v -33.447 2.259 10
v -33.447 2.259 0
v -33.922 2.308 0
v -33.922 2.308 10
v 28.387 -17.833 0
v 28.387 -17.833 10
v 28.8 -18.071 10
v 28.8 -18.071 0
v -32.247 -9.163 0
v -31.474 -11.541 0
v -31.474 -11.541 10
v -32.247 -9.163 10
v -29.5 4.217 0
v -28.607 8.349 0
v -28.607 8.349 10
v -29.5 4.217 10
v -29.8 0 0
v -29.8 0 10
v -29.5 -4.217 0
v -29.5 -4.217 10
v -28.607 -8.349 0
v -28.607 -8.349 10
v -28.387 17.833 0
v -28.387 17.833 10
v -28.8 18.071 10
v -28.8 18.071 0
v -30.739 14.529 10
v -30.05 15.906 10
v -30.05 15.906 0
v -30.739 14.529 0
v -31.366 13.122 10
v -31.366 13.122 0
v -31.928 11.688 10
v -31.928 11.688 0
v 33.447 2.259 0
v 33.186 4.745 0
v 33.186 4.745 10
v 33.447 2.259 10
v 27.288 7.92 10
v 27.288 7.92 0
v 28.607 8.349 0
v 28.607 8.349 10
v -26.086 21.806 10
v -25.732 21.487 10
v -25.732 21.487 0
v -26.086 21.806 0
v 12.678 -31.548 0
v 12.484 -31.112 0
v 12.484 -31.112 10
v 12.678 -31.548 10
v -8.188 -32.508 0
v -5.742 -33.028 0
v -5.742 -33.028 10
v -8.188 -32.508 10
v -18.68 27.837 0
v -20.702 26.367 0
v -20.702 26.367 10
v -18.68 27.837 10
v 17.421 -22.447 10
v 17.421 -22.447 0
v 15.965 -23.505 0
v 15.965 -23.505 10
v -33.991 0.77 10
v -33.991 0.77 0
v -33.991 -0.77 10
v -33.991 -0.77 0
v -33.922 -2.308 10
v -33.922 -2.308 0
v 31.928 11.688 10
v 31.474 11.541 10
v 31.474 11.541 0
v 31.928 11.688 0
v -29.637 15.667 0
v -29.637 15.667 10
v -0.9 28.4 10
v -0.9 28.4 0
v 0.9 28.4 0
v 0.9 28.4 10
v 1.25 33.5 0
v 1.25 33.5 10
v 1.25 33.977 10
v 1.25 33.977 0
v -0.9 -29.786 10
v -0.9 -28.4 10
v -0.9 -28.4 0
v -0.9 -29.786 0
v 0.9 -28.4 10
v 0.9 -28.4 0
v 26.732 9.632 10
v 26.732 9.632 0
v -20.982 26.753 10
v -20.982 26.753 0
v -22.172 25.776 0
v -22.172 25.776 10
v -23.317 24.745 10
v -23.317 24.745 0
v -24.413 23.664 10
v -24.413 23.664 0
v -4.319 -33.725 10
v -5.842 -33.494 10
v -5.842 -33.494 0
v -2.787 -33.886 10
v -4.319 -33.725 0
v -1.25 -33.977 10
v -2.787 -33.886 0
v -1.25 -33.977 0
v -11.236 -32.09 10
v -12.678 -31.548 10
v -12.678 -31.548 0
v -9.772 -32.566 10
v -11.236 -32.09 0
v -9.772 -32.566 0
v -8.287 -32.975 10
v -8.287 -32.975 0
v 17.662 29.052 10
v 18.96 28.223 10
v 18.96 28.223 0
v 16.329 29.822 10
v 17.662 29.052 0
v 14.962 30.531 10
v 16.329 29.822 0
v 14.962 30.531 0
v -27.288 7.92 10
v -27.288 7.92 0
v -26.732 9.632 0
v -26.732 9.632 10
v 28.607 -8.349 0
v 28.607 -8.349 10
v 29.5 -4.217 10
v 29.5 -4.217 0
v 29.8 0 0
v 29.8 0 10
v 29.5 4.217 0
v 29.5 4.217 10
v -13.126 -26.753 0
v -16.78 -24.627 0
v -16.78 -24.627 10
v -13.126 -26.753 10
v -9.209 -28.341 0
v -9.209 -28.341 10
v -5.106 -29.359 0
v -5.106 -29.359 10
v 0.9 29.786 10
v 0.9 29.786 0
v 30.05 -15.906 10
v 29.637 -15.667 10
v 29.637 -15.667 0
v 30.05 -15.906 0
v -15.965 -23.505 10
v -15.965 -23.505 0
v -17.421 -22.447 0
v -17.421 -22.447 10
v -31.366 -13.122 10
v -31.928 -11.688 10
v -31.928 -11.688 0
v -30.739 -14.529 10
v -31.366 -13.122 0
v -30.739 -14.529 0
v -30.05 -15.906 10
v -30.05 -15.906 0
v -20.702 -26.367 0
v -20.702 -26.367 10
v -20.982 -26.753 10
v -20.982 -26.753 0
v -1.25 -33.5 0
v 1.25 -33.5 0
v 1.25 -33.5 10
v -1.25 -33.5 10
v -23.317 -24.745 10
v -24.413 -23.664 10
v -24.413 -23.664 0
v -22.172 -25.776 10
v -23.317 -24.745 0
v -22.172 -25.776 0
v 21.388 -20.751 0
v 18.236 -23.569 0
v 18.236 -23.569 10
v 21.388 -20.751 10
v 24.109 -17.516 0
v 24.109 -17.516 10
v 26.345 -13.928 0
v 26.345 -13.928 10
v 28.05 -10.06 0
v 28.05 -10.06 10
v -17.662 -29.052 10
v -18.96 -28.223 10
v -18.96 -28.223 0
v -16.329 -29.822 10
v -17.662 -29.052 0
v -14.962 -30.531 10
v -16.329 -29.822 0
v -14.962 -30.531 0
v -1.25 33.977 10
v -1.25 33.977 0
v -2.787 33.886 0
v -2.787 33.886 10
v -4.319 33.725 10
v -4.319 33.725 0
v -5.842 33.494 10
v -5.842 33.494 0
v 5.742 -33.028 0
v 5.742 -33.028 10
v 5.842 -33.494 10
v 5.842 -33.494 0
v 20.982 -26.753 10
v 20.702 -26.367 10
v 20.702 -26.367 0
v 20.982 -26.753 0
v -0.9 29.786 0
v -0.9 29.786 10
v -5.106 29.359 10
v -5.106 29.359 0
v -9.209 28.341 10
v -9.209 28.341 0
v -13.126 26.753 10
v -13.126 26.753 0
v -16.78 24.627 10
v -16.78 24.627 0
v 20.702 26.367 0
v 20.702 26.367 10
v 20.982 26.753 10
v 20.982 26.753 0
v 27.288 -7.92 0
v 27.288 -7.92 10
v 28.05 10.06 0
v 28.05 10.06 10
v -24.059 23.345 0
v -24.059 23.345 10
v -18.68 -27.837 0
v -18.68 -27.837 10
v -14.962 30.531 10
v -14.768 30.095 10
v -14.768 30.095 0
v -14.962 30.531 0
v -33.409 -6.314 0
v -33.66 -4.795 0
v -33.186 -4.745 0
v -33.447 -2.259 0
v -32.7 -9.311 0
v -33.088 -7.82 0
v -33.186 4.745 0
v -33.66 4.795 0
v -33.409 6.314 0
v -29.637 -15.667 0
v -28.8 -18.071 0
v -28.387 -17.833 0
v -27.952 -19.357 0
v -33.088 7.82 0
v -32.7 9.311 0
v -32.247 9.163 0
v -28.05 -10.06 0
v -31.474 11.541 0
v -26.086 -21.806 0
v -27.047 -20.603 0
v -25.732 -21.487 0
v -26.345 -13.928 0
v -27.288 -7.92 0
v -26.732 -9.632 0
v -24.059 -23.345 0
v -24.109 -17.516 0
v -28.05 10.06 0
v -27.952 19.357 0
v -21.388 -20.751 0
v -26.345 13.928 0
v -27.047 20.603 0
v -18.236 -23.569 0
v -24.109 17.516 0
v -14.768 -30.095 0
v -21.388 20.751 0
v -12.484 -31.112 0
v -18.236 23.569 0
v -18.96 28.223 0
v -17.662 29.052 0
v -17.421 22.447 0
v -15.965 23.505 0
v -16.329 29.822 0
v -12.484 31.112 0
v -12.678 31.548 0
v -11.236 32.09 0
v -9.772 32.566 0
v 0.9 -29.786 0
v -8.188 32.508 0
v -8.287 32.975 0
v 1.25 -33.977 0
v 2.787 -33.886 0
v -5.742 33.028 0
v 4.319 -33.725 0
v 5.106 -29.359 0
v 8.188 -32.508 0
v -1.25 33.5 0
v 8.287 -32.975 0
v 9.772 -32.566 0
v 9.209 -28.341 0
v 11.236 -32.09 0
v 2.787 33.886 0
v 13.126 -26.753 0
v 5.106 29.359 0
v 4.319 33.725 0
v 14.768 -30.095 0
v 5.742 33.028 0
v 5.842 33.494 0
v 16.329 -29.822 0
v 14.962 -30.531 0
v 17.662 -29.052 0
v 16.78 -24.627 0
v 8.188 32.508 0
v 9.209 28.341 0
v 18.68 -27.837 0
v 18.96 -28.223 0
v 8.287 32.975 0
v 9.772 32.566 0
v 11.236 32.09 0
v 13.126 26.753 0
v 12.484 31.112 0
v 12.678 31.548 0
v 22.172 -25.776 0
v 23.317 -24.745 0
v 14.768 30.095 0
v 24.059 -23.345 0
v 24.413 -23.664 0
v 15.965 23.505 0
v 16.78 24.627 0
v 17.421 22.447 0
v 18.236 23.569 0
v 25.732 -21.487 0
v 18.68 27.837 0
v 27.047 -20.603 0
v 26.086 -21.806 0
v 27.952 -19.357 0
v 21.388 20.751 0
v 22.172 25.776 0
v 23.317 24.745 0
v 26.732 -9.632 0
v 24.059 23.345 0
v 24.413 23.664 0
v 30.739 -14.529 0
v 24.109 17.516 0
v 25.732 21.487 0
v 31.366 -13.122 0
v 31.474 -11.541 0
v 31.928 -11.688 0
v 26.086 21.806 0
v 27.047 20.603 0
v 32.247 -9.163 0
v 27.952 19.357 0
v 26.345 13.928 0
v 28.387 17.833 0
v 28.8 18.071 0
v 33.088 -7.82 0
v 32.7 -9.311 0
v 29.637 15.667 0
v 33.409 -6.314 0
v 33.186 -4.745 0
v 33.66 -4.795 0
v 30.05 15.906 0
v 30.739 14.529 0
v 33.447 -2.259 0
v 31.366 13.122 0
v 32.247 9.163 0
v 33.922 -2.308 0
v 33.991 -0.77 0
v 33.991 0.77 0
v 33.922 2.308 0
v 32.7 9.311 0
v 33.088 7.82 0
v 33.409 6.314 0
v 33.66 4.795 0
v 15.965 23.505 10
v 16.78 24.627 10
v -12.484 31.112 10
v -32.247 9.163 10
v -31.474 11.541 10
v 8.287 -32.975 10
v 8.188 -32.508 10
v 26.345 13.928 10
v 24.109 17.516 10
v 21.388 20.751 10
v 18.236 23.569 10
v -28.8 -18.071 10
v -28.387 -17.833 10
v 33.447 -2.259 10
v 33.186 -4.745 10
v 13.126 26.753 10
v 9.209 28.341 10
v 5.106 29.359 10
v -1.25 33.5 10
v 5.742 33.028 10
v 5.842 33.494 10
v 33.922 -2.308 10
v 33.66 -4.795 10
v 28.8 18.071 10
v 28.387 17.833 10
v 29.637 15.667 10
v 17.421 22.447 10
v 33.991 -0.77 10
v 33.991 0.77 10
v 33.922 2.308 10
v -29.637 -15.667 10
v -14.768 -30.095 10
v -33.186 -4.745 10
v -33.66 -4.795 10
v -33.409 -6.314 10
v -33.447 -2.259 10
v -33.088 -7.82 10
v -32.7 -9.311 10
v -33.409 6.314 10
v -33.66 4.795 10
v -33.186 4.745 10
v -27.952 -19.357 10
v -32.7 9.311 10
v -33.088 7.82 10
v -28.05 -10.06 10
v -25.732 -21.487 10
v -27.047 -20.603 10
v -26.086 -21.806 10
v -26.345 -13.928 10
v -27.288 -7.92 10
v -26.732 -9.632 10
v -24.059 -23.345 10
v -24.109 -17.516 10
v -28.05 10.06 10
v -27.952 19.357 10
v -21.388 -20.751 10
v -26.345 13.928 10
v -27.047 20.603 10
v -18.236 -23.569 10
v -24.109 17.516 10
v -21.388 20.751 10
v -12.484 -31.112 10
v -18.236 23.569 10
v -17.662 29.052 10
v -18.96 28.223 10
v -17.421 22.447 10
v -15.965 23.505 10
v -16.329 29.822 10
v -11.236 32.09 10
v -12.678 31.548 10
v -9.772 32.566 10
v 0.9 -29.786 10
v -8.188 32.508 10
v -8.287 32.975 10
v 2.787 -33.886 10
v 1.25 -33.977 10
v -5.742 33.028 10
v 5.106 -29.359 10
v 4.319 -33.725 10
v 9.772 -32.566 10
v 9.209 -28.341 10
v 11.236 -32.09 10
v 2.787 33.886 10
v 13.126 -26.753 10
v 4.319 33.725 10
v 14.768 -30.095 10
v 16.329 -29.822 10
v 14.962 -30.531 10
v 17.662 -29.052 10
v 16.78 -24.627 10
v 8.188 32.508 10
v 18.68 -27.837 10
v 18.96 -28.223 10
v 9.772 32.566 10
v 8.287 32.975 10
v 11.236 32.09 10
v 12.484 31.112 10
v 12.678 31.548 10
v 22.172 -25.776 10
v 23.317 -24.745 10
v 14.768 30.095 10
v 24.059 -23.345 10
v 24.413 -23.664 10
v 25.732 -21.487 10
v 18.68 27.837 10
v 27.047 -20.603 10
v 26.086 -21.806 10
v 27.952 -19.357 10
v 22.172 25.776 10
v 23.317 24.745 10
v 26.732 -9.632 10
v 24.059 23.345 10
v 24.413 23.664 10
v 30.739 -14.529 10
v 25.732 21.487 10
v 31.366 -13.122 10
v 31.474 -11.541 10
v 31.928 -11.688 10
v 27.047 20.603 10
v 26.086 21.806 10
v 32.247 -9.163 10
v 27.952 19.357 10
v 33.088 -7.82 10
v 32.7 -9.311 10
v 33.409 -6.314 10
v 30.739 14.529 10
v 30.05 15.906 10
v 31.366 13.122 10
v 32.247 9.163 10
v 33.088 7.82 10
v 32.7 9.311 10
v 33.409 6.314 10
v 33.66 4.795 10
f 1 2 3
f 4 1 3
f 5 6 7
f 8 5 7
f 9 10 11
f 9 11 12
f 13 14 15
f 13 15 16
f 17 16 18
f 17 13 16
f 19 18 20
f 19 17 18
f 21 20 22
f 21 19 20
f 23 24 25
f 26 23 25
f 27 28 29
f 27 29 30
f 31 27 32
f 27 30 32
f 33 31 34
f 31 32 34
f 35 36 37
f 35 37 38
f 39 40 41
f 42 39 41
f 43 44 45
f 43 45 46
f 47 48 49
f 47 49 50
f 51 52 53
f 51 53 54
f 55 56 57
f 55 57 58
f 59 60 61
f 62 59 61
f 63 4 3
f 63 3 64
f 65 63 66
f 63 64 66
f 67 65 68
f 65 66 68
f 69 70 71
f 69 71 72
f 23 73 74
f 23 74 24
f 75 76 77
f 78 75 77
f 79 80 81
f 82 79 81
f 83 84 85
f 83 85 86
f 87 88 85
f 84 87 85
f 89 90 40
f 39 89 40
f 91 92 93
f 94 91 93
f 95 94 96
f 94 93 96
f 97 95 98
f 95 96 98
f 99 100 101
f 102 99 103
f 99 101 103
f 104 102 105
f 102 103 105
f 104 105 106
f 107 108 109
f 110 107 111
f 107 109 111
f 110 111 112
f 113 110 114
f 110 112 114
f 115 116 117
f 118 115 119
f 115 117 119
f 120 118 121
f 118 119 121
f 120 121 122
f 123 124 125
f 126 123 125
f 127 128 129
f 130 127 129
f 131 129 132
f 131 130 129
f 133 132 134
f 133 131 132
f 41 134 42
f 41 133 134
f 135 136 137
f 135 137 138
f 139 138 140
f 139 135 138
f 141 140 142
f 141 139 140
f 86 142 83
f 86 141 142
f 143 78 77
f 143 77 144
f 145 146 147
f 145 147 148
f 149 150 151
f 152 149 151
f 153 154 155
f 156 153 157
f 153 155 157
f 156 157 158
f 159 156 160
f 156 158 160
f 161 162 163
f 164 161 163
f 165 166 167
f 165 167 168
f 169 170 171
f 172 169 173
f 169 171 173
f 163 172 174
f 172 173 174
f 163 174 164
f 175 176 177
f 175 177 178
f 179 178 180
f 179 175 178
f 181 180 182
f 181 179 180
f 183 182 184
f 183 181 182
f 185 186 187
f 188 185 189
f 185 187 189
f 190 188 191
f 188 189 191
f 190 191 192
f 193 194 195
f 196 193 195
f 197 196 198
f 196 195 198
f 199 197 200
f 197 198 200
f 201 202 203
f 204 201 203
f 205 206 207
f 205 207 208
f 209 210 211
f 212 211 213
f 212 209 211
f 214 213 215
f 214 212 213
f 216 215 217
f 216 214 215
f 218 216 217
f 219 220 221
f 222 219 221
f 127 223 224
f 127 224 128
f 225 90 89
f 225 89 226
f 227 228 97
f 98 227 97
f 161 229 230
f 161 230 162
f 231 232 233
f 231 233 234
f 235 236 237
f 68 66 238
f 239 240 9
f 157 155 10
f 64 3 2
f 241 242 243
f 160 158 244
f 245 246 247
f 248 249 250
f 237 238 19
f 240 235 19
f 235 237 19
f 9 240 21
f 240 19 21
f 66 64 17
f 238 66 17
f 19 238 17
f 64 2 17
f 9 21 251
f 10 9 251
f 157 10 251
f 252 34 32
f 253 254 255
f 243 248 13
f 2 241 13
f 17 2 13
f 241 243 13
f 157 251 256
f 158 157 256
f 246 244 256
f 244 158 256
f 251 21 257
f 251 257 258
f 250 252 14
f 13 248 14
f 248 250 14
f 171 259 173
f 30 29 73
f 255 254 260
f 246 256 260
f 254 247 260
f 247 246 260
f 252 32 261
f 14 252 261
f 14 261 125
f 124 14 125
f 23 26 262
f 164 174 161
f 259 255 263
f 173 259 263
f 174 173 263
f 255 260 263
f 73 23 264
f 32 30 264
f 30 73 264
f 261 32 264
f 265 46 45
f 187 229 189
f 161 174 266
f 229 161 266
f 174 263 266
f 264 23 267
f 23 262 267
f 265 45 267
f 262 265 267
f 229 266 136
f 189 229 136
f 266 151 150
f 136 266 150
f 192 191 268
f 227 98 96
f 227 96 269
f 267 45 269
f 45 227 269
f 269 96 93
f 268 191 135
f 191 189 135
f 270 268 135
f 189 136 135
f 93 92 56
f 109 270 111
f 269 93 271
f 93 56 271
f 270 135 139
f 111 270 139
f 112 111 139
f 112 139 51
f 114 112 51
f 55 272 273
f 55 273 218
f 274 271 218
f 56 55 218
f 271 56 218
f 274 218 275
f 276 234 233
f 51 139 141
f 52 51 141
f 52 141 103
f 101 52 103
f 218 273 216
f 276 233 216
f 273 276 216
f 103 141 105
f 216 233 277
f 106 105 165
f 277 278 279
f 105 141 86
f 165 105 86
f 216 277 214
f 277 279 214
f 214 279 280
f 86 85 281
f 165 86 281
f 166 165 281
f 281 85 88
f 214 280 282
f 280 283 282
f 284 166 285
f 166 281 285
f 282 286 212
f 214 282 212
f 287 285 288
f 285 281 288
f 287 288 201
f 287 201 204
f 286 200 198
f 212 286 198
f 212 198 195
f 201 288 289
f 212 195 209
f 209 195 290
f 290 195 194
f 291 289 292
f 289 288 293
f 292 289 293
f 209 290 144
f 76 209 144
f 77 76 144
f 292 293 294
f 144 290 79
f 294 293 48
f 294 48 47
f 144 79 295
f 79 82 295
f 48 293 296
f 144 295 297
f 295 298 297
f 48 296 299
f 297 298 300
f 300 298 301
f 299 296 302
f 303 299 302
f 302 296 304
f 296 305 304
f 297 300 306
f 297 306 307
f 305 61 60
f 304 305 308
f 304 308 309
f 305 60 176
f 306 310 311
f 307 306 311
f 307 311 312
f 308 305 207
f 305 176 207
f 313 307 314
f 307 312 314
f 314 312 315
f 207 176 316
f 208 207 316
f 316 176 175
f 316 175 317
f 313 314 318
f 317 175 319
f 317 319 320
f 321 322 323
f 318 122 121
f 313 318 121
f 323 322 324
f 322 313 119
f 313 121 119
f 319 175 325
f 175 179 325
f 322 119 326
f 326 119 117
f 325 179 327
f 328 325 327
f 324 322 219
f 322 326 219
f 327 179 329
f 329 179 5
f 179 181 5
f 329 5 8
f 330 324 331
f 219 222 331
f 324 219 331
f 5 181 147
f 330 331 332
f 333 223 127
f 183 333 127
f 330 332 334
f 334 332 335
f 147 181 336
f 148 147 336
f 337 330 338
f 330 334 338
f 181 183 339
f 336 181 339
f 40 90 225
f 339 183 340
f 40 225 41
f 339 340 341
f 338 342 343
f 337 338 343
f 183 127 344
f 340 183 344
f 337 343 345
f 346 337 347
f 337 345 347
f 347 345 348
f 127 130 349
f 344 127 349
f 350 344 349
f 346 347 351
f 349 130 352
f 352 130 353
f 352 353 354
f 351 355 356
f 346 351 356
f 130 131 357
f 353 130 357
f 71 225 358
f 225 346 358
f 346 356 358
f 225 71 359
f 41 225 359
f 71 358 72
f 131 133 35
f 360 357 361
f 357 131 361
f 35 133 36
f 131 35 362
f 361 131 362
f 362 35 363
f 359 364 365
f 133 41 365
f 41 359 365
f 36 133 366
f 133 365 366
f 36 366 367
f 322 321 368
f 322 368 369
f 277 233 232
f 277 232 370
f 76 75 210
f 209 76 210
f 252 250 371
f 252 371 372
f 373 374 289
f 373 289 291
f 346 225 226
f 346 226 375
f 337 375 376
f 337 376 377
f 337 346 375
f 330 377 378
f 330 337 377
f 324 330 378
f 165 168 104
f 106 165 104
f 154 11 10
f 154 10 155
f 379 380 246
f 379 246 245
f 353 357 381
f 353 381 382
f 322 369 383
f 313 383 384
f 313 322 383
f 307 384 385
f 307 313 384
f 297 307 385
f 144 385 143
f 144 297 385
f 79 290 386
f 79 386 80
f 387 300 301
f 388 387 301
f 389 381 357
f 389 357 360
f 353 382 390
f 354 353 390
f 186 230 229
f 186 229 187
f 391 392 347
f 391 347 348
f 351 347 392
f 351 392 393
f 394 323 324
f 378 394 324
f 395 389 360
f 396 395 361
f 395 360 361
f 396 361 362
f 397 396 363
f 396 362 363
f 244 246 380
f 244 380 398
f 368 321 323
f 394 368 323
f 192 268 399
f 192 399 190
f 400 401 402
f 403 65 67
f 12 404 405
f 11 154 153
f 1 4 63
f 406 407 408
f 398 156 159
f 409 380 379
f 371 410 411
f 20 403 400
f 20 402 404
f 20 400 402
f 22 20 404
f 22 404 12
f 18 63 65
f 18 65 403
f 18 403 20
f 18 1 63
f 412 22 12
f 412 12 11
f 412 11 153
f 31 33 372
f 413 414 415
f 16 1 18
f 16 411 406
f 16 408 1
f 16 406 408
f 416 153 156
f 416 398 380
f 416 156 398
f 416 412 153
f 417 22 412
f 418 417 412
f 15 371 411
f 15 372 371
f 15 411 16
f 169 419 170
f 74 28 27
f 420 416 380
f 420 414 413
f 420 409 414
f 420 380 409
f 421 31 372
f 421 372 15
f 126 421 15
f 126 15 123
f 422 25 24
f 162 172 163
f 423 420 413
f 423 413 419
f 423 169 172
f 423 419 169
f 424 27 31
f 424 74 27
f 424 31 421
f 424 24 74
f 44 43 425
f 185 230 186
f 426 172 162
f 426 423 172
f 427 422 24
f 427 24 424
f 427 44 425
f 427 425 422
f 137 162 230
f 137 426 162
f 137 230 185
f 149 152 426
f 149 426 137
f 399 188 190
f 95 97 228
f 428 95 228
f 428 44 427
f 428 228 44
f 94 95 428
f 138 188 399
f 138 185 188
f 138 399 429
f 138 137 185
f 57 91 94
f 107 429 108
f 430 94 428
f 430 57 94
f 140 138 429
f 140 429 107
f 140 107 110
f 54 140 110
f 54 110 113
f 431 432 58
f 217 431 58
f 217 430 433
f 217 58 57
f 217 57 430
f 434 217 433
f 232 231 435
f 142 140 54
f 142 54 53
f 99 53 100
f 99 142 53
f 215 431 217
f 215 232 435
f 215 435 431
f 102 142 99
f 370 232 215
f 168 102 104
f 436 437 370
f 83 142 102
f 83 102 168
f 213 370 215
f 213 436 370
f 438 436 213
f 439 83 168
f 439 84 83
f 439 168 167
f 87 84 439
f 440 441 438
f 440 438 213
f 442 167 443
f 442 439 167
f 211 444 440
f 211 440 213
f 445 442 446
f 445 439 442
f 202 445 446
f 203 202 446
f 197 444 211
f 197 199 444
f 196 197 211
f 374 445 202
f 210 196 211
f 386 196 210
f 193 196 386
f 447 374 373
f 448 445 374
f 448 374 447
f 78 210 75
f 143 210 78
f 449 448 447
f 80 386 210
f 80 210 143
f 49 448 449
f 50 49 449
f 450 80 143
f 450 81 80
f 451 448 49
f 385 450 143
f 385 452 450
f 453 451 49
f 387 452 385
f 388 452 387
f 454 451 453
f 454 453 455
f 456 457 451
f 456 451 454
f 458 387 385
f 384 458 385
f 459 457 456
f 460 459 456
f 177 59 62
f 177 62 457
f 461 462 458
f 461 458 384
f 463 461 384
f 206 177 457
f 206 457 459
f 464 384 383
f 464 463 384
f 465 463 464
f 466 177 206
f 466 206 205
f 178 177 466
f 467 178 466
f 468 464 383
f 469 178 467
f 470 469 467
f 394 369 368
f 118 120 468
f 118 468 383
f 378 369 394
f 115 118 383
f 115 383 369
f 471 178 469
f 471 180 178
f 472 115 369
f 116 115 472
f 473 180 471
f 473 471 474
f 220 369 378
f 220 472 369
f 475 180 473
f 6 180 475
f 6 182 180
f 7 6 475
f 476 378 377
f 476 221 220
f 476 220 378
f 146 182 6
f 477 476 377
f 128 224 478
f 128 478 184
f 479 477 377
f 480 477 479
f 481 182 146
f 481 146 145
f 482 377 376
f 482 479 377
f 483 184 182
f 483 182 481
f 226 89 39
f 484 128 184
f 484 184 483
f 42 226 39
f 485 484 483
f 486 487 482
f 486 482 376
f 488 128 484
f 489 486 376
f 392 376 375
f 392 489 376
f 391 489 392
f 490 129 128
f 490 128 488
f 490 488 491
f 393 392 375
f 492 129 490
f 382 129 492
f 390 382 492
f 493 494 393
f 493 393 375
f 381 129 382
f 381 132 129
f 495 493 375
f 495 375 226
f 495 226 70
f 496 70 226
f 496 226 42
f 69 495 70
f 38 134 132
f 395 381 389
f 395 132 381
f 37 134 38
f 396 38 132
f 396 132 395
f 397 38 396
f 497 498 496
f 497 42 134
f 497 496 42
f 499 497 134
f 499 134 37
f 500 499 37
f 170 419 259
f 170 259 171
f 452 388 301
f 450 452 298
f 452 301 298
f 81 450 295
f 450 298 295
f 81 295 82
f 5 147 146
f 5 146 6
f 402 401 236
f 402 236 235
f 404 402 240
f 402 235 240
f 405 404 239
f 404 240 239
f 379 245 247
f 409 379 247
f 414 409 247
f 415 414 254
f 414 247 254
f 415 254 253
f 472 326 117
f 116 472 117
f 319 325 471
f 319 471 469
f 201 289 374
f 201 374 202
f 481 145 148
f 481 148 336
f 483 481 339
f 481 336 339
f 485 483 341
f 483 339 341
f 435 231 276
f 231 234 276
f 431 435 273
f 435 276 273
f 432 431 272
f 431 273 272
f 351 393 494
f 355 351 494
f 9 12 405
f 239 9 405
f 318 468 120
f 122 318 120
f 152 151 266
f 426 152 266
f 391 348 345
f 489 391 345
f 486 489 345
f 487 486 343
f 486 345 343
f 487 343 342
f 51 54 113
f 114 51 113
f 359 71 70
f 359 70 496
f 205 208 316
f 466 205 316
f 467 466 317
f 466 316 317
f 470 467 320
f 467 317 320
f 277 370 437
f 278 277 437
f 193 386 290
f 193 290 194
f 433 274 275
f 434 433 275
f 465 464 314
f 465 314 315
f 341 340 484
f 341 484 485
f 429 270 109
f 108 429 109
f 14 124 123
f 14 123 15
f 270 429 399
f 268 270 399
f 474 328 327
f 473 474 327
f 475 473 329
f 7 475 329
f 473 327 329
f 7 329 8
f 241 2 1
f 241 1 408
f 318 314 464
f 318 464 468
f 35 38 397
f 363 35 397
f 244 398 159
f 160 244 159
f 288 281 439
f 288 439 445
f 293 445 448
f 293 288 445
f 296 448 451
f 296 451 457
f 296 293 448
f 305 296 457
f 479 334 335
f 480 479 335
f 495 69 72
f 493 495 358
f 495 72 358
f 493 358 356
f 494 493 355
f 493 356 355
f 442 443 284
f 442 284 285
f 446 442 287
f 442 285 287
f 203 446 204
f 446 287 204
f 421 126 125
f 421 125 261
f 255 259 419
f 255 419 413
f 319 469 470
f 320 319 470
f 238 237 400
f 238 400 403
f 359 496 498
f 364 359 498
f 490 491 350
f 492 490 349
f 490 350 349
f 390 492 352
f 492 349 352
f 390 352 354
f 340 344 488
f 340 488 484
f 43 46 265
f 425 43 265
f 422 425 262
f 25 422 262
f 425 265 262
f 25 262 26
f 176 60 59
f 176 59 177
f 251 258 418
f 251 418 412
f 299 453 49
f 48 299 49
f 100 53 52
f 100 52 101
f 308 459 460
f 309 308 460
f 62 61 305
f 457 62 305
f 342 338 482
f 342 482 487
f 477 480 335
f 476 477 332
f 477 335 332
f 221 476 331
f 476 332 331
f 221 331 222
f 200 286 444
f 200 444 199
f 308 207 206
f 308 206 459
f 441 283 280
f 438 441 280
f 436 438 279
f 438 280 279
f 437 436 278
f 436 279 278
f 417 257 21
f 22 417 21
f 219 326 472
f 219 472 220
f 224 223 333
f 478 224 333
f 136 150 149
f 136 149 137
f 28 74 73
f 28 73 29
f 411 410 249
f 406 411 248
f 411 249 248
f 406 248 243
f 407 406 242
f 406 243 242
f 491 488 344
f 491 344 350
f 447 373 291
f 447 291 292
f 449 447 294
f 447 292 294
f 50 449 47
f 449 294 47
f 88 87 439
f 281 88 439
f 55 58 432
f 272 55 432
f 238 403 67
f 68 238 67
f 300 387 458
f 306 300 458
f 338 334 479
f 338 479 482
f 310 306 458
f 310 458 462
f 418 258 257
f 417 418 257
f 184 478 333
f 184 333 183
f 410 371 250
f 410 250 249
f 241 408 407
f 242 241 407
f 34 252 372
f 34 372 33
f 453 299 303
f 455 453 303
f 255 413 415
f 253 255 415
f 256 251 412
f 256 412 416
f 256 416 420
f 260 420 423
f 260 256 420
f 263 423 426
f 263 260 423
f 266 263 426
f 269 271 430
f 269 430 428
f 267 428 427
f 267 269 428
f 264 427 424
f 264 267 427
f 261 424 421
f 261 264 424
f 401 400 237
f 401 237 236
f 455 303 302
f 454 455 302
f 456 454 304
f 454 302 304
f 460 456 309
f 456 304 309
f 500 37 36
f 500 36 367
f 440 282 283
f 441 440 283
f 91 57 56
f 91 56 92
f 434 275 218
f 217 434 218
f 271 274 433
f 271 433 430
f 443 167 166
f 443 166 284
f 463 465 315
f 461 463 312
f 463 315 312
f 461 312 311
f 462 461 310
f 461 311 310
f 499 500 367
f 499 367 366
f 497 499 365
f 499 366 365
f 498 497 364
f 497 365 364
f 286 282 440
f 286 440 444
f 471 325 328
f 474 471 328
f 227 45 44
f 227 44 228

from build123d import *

# Parameters (mm, degrees)
SKETCH2_R           = 34
BOSS_EXTRUDE1_DEPTH = 10
SKETCH3_R           = 29.8
CUT_EXTRUDE1_DEPTH  = 50.112116631
SKETCH4_W           = 1.8
SKETCH4_H           = 2.8
BOSS_EXTRUDE2_DEPTH = 10
CIRPATTERN1_COUNT   = 10
SKETCH5_W           = 2.5
SKETCH5_H           = 1
CUT_EXTRUDE2_DEPTH  = 50.112116631
CIRPATTERN3_COUNT   = 30


with BuildPart() as part:
    # Sketch2 → Boss-Extrude1 (new body)
    with BuildSketch(Plane.XY):
        Circle(SKETCH2_R)
    extrude(amount=BOSS_EXTRUDE1_DEPTH)

    # Sketch3 → Cut-Extrude1 (cut, through all)
    with BuildSketch(Plane.XY):
        Circle(SKETCH3_R)
    extrude(amount=CUT_EXTRUDE1_DEPTH, mode=Mode.SUBTRACT)

    # Sketch4 → Boss-Extrude2 (add)
    with BuildSketch(Plane.XY):
        with Locations((0, 29.8)):
            Rectangle(SKETCH4_W, SKETCH4_H)
    boss_extrude2 = extrude(amount=BOSS_EXTRUDE2_DEPTH)

    # CirPattern1: Boss-Extrude2 ×10 about axis
    cirpattern1_axis = Axis((0, 0, 0), (0, 0, 1))
    for i in range(1, CIRPATTERN1_COUNT):
        add(boss_extrude2.rotate(cirpattern1_axis, i * 360 / CIRPATTERN1_COUNT))

    # Sketch5 → Cut-Extrude2 (cut, through all)
    with BuildSketch(Plane.XY):
        with Locations((0, 34)):
            Rectangle(SKETCH5_W, SKETCH5_H)
    cut_extrude2 = extrude(amount=CUT_EXTRUDE2_DEPTH, mode=Mode.SUBTRACT)

    # CirPattern3: Cut-Extrude2 ×30 about axis
    cirpattern3_axis = Axis((0, 0, 0), (0, 0, 1))
    for i in range(1, CIRPATTERN3_COUNT):
        add(cut_extrude2.rotate(cirpattern3_axis, i * 360 / CIRPATTERN3_COUNT), mode=Mode.SUBTRACT)


solid = part.part
